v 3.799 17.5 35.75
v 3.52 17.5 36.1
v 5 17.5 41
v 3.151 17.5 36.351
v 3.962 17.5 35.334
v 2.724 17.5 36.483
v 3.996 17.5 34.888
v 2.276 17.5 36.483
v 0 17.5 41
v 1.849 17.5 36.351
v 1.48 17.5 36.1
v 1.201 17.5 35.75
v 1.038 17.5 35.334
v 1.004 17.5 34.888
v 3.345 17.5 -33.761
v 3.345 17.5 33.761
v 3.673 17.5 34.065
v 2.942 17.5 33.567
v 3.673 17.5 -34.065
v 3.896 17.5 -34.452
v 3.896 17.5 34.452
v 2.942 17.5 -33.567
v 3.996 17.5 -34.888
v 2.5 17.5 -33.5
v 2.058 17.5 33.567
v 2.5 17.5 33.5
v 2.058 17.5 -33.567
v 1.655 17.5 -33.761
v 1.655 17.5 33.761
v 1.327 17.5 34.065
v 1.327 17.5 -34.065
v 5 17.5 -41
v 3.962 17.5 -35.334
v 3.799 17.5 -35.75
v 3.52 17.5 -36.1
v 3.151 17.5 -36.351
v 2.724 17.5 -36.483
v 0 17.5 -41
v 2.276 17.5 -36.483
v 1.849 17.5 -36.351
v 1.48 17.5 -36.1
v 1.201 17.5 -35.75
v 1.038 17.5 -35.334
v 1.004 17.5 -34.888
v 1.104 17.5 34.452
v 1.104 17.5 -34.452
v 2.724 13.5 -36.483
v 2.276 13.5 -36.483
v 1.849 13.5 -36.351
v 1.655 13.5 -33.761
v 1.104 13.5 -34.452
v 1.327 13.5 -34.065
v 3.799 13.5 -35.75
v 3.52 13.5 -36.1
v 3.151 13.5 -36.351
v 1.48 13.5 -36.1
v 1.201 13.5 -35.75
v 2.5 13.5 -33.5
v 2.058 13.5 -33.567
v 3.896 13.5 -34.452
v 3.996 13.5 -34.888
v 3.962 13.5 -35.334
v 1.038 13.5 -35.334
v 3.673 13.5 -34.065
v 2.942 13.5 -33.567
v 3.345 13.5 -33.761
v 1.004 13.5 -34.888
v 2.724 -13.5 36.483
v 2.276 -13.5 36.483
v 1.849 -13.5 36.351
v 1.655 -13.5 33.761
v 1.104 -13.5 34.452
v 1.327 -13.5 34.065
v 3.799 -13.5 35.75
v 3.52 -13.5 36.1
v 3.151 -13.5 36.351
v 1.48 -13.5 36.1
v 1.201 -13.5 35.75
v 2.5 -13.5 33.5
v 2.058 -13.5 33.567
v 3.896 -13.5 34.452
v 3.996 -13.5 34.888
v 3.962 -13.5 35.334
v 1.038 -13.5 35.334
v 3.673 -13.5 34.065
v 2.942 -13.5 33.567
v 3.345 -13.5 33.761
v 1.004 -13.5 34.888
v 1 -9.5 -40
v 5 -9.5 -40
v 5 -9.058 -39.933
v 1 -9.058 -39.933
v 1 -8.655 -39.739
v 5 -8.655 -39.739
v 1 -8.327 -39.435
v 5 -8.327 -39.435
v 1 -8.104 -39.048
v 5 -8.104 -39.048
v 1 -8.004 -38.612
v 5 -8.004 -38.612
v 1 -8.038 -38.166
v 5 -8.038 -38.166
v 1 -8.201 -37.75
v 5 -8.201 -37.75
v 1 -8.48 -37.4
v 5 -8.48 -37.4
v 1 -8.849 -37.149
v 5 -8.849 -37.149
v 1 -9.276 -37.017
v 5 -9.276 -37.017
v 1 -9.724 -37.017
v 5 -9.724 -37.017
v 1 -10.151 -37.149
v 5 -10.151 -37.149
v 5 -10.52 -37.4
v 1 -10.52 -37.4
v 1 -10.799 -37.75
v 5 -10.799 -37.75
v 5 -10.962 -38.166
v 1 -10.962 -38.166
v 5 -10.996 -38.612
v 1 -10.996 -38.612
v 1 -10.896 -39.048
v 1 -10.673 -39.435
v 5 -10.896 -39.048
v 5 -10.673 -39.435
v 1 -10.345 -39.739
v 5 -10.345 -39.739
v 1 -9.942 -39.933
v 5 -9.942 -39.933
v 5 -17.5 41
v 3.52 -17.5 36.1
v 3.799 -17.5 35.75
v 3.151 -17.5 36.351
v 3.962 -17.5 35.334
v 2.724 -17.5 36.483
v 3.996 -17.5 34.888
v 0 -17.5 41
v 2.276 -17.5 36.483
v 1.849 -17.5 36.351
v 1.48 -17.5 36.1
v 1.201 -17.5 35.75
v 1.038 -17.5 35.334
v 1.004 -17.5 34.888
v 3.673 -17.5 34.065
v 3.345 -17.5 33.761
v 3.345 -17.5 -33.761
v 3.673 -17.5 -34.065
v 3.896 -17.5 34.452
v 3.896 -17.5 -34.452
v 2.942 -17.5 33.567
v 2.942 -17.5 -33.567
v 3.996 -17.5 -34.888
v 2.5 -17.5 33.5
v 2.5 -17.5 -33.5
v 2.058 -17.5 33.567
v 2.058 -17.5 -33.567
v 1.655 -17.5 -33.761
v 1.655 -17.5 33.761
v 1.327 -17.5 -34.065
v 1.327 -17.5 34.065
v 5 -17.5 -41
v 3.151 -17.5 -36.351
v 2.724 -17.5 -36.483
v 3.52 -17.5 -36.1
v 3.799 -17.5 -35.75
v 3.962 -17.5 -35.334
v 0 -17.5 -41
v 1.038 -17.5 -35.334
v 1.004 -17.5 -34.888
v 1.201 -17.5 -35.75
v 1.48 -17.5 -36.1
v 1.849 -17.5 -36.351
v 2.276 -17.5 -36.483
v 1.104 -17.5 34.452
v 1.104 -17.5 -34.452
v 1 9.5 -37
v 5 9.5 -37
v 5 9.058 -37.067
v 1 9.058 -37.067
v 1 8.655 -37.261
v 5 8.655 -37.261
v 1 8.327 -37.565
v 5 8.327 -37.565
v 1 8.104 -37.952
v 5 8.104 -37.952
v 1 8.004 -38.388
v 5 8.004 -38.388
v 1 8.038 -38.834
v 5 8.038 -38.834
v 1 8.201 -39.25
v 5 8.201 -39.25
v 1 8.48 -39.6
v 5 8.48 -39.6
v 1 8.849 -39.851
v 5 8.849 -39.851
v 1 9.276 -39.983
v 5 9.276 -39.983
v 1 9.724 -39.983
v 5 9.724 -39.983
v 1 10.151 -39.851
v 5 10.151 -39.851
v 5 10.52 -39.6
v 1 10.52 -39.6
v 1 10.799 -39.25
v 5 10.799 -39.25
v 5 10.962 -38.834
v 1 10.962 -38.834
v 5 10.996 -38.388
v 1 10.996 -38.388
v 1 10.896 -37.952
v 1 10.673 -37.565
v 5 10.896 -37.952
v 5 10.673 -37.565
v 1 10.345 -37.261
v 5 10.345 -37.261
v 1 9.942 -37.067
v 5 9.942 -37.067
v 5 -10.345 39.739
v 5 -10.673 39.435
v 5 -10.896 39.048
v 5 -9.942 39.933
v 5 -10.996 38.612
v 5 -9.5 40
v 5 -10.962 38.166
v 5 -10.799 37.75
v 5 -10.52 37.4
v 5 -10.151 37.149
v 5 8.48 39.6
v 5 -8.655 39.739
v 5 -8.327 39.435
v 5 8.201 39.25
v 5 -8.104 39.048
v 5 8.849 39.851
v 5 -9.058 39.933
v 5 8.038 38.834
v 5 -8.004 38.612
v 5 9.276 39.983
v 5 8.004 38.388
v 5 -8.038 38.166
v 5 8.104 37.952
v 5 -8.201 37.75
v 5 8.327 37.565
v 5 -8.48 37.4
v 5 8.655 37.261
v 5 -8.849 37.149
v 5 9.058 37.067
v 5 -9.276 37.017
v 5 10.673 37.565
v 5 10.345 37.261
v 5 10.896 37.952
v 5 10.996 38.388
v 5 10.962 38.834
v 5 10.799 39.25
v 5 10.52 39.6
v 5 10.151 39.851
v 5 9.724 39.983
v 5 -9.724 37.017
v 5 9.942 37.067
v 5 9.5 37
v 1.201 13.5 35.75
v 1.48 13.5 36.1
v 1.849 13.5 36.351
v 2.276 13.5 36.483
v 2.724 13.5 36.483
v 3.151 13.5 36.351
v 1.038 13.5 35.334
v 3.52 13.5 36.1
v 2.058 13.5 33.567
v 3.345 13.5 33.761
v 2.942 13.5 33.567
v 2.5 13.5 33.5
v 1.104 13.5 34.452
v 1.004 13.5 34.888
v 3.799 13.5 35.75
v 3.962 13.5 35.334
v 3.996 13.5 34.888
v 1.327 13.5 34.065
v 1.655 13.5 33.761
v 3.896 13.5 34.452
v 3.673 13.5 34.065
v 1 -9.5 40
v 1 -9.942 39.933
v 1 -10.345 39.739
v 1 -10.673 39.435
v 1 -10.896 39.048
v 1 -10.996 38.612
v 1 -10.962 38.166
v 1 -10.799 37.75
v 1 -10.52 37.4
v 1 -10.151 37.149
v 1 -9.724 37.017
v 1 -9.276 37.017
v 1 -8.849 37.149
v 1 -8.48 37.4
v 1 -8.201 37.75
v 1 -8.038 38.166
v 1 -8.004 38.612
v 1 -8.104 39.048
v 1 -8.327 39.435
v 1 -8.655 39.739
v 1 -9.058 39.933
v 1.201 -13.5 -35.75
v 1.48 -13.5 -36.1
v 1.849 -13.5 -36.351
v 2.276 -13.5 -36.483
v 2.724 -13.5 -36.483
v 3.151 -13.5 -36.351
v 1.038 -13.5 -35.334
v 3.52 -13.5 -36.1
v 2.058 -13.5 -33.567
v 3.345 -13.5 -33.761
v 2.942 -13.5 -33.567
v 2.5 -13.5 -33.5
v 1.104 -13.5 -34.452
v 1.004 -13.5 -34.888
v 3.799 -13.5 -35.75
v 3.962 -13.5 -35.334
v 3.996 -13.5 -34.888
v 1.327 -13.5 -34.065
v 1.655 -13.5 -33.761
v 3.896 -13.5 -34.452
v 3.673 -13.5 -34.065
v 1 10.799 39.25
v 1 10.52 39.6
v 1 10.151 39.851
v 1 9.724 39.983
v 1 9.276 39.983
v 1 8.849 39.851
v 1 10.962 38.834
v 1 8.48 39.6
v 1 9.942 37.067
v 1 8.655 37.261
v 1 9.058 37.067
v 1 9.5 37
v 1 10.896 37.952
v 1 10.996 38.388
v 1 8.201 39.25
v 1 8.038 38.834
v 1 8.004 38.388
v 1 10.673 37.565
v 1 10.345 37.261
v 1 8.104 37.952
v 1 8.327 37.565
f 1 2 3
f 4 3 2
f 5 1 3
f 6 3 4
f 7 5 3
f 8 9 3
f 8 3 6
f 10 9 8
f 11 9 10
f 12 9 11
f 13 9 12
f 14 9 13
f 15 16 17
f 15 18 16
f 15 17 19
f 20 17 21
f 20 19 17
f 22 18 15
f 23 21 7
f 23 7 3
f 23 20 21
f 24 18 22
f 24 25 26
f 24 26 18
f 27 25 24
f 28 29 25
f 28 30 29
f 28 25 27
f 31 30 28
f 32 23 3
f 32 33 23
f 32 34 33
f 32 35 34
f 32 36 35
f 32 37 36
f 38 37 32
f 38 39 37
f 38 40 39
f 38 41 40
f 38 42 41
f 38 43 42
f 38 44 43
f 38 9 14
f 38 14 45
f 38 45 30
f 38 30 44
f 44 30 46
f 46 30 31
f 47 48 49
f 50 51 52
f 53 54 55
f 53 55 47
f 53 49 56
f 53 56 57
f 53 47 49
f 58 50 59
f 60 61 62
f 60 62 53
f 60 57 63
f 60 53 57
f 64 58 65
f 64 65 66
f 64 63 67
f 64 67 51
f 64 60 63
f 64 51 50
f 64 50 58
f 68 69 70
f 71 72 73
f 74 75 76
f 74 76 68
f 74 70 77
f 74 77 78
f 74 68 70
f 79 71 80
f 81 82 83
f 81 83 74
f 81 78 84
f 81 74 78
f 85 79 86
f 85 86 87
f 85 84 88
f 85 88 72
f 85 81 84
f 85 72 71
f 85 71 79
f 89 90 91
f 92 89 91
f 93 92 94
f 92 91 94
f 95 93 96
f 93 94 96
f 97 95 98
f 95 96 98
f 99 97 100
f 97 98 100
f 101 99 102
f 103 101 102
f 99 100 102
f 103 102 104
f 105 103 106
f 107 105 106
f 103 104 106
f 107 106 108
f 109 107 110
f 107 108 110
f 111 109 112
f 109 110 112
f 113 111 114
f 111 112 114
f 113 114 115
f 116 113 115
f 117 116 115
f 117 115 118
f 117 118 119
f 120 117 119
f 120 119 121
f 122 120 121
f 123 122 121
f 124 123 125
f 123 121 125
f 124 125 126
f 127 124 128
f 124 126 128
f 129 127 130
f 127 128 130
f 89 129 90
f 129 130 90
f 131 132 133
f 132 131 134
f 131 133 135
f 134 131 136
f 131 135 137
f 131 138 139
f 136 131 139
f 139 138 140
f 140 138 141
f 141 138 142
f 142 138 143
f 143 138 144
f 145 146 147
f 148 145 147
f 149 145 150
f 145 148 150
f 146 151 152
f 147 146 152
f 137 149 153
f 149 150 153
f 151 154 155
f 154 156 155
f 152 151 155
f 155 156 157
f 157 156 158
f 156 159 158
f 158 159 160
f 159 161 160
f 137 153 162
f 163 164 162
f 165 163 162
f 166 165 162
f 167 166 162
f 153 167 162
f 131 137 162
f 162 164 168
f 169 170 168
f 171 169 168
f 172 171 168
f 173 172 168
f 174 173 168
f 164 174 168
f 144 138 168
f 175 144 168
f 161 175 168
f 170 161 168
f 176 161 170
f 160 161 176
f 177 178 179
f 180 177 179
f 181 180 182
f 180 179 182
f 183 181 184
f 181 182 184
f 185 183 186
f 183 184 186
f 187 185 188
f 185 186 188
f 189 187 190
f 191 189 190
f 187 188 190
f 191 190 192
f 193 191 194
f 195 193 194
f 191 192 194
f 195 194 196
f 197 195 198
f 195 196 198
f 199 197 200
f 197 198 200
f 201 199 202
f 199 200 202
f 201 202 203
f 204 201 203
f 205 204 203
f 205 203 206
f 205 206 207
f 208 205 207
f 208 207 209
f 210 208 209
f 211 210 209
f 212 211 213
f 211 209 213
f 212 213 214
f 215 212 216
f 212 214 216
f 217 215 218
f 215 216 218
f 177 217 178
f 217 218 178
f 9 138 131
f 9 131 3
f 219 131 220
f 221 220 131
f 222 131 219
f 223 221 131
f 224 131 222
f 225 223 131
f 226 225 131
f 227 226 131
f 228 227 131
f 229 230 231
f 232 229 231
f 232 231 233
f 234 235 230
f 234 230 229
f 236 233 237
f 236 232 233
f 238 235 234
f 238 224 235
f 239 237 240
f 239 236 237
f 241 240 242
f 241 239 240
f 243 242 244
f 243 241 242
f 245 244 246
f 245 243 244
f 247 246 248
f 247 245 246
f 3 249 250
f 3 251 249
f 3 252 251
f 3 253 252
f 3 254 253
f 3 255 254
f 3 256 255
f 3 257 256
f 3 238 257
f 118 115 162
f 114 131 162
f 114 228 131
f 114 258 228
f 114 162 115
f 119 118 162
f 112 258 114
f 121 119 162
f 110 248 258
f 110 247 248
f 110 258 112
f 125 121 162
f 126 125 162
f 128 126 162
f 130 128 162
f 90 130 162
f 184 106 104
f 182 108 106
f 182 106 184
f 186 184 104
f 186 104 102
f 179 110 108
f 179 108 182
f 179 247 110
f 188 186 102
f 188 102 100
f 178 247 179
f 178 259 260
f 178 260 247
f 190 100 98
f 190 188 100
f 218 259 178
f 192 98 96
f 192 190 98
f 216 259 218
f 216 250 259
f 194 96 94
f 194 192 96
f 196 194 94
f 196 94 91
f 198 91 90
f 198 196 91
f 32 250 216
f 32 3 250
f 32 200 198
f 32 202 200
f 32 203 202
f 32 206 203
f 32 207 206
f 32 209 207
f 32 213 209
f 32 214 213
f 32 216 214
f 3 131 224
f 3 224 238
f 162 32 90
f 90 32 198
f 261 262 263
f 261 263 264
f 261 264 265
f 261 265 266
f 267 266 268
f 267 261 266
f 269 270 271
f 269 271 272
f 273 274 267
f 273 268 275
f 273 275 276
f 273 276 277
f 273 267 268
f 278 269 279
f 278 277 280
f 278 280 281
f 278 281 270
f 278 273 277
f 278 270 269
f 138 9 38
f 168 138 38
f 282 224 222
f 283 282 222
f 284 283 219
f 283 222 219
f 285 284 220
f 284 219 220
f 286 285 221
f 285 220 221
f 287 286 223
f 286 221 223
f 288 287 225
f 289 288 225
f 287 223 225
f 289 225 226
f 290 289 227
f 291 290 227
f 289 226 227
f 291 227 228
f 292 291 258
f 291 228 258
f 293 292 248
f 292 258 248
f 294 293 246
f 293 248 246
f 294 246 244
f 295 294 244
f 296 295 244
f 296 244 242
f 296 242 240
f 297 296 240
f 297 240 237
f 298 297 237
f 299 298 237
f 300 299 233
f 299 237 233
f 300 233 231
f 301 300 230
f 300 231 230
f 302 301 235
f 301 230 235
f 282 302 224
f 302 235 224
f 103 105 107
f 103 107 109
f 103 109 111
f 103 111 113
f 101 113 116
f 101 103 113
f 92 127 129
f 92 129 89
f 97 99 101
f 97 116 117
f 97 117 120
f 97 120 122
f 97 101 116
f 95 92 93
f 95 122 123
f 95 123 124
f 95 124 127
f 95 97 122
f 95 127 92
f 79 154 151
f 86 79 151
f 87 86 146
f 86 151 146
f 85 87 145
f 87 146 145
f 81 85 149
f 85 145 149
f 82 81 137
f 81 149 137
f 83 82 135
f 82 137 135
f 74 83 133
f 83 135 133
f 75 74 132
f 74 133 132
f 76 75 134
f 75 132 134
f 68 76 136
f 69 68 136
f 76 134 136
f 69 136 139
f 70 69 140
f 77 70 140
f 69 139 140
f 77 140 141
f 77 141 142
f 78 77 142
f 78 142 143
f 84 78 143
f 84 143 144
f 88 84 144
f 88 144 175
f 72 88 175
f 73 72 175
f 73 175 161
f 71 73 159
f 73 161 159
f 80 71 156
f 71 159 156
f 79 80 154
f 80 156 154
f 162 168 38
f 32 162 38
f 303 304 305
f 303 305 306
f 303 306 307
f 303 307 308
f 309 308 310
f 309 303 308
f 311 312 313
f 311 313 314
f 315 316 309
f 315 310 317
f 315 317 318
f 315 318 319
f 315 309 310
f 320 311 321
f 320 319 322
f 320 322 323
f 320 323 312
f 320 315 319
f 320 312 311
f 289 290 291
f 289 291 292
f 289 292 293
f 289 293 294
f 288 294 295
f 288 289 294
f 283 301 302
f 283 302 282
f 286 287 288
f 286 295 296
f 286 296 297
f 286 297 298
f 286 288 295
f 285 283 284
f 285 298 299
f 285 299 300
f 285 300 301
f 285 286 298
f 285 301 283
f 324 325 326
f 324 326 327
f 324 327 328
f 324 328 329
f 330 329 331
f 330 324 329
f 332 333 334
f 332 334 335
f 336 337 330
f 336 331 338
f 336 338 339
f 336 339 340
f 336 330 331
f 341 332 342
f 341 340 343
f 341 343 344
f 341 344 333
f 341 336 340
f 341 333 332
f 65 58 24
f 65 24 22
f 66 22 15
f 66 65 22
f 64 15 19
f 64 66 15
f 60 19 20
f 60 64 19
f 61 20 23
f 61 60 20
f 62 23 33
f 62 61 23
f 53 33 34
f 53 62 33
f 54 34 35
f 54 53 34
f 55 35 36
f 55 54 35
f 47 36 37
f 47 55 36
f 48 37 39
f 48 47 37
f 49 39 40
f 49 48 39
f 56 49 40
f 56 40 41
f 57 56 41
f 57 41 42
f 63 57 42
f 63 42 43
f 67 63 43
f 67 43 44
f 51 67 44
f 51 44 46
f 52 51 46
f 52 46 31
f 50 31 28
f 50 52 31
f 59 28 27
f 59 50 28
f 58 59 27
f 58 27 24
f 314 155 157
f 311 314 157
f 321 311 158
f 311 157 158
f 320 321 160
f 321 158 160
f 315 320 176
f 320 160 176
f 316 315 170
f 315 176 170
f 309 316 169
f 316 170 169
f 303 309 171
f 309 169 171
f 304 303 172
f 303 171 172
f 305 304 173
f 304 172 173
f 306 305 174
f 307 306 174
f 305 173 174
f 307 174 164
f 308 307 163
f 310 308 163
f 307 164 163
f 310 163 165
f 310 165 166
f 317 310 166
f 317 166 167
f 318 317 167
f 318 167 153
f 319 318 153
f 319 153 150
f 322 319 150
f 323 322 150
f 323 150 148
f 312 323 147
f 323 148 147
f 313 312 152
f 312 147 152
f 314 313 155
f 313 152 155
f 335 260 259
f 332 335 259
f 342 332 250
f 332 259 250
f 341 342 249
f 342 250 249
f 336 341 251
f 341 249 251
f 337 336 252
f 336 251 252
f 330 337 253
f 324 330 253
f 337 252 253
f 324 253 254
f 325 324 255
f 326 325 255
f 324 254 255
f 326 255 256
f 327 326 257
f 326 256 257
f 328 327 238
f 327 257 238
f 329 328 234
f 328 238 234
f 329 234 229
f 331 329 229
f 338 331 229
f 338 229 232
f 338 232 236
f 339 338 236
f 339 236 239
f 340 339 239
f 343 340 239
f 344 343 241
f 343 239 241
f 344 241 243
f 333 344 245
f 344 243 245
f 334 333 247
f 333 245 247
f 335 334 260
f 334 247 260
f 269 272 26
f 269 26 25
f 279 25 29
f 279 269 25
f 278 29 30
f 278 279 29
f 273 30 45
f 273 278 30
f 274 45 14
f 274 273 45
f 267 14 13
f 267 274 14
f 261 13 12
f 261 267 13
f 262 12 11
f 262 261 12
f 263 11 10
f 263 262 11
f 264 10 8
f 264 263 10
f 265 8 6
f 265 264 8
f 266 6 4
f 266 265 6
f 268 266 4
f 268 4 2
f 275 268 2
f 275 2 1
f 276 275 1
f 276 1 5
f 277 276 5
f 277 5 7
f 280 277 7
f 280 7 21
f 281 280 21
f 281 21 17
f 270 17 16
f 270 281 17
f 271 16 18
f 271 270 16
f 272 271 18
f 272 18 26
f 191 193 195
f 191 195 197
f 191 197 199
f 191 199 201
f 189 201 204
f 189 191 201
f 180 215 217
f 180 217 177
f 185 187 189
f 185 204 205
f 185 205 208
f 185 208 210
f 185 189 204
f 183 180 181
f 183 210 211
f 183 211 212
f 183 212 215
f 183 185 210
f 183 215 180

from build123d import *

# Parameters (mm, degrees)
SKETCH1_W           = 82
SKETCH1_H           = 35
BOSS_EXTRUDE1_DEPTH = 5
SKETCH2_R           = 1.5
CUT_EXTRUDE1_DEPTH  = 4
SKETCH3_R           = 1.5
CUT_EXTRUDE2_DEPTH  = 4
CUT_EXTRUDE3_START  = -4
SKETCH4_R           = 1.5
CUT_EXTRUDE3_DEPTH  = 4


with BuildPart() as part:
    # Sketch1 → Boss-Extrude1 (new body)
    with BuildSketch(Plane(origin=(0, 0, 0), x_dir=(0, 0, -1), z_dir=(1, 0, 0))):
        Rectangle(SKETCH1_W, SKETCH1_H)
    extrude(amount=BOSS_EXTRUDE1_DEPTH)

    # Sketch2 → Cut-Extrude1 (cut)
    with BuildSketch(Plane(origin=(5, 0, 0), x_dir=(0, 0, -1), z_dir=(1, 0, 0))):
        with Locations((-38.5, 9.5)):
            Circle(SKETCH2_R)
        with Locations(Location((-38.5, -9.5, 0), (0, 0, 180))):
            Circle(SKETCH2_R)
        with Locations((38.5, -9.5)):
            Circle(SKETCH2_R)
        with Locations(Location((38.5, 9.5, 0), (0, 0, 180))):
            Circle(SKETCH2_R)
    extrude(amount=-CUT_EXTRUDE1_DEPTH, mode=Mode.SUBTRACT)

    # Sketch3 → Cut-Extrude2 (cut)
    with BuildSketch(Plane.XZ.offset(17.5)):
        with Locations(Location((2.5, 35, 0), (0, 0, 270))):
            Circle(SKETCH3_R)
        with Locations(Location((2.5, -35, 0), (0, 0, 90))):
            Circle(SKETCH3_R)
    extrude(amount=-CUT_EXTRUDE2_DEPTH, mode=Mode.SUBTRACT)

    # Sketch4 → Cut-Extrude3 (cut)
    with BuildSketch(Plane(origin=(0, 17.5, 0), x_dir=(1, 0, 0), z_dir=(0, 1, 0)).offset(CUT_EXTRUDE3_START)):
        with Locations(Location((2.5, -35, 0), (0, 0, 90))):
            Circle(SKETCH4_R)
        with Locations(Location((2.5, 35, 0), (0, 0, 270))):
            Circle(SKETCH4_R)
    extrude(amount=CUT_EXTRUDE3_DEPTH, mode=Mode.SUBTRACT)


solid = part.part
